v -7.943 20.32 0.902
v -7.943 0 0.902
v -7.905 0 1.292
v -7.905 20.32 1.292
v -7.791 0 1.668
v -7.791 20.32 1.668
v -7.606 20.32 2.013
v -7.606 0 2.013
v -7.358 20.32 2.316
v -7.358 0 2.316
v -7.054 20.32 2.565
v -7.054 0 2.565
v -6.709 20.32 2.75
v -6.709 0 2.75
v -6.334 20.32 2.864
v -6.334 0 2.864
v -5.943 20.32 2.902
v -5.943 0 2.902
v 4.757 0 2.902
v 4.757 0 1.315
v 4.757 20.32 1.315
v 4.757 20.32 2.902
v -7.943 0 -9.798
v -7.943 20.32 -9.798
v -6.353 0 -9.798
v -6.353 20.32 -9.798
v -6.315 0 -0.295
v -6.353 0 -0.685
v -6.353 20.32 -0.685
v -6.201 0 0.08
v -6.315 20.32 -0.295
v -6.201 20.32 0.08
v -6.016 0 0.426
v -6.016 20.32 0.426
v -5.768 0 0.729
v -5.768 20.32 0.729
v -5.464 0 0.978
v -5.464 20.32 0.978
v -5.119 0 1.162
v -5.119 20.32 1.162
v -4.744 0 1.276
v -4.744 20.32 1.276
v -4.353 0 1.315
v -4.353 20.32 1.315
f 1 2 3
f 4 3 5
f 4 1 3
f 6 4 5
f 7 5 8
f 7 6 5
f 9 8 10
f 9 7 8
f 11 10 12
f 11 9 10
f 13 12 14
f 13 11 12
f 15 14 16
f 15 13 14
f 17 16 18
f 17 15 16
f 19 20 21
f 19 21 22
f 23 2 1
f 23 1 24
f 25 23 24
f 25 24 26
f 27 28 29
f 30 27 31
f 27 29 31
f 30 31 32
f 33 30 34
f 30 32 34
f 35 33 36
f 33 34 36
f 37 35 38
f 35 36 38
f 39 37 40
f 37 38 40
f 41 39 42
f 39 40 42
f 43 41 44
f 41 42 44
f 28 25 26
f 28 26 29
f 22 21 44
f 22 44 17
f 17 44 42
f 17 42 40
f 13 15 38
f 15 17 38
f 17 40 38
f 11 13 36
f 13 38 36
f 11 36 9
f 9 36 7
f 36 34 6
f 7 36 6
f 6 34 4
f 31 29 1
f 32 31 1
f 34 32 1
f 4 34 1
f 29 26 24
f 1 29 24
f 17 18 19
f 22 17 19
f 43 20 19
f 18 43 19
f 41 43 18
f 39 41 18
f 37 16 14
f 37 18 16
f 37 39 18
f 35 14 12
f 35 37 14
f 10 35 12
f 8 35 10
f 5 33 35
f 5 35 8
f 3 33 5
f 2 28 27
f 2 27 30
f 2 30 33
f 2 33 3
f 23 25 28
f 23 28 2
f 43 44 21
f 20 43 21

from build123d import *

# Parameters (mm, degrees)
BOSS_EXTRUDE1_DEPTH = 20.32
FILLET1_R           = 2
FILLET2_R           = 2


with BuildPart() as part:
    # Sketch1 → Boss-Extrude1 (new body)
    with BuildSketch(Plane(origin=(0, 0, 0), x_dir=(1, 0, 0), z_dir=(0, 1, 0))):
        Polygon((-7.943330105, 9.7977882), (-6.353330105, 9.7977882), (-6.353330105, -1.3147118), (4.756669895, -1.3147118), (4.756669895, -2.9022118), (-6.353330105, -2.9022118), (-7.943330105, -2.9022118), align=None)
    extrude(amount=BOSS_EXTRUDE1_DEPTH)

    # Fillet1
    fillet1_edges = [part.edges().sort_by_distance(p)[0] for p in [
        (-6.353330105, 10.16, 1.3147118),
    ]]
    fillet(fillet1_edges, radius=FILLET1_R)

    # Fillet2
    fillet2_edges = [part.edges().sort_by_distance(p)[0] for p in [
        (-7.943330105, 10.16, 2.9022118),
    ]]
    fillet(fillet2_edges, radius=FILLET2_R)


solid = part.part
